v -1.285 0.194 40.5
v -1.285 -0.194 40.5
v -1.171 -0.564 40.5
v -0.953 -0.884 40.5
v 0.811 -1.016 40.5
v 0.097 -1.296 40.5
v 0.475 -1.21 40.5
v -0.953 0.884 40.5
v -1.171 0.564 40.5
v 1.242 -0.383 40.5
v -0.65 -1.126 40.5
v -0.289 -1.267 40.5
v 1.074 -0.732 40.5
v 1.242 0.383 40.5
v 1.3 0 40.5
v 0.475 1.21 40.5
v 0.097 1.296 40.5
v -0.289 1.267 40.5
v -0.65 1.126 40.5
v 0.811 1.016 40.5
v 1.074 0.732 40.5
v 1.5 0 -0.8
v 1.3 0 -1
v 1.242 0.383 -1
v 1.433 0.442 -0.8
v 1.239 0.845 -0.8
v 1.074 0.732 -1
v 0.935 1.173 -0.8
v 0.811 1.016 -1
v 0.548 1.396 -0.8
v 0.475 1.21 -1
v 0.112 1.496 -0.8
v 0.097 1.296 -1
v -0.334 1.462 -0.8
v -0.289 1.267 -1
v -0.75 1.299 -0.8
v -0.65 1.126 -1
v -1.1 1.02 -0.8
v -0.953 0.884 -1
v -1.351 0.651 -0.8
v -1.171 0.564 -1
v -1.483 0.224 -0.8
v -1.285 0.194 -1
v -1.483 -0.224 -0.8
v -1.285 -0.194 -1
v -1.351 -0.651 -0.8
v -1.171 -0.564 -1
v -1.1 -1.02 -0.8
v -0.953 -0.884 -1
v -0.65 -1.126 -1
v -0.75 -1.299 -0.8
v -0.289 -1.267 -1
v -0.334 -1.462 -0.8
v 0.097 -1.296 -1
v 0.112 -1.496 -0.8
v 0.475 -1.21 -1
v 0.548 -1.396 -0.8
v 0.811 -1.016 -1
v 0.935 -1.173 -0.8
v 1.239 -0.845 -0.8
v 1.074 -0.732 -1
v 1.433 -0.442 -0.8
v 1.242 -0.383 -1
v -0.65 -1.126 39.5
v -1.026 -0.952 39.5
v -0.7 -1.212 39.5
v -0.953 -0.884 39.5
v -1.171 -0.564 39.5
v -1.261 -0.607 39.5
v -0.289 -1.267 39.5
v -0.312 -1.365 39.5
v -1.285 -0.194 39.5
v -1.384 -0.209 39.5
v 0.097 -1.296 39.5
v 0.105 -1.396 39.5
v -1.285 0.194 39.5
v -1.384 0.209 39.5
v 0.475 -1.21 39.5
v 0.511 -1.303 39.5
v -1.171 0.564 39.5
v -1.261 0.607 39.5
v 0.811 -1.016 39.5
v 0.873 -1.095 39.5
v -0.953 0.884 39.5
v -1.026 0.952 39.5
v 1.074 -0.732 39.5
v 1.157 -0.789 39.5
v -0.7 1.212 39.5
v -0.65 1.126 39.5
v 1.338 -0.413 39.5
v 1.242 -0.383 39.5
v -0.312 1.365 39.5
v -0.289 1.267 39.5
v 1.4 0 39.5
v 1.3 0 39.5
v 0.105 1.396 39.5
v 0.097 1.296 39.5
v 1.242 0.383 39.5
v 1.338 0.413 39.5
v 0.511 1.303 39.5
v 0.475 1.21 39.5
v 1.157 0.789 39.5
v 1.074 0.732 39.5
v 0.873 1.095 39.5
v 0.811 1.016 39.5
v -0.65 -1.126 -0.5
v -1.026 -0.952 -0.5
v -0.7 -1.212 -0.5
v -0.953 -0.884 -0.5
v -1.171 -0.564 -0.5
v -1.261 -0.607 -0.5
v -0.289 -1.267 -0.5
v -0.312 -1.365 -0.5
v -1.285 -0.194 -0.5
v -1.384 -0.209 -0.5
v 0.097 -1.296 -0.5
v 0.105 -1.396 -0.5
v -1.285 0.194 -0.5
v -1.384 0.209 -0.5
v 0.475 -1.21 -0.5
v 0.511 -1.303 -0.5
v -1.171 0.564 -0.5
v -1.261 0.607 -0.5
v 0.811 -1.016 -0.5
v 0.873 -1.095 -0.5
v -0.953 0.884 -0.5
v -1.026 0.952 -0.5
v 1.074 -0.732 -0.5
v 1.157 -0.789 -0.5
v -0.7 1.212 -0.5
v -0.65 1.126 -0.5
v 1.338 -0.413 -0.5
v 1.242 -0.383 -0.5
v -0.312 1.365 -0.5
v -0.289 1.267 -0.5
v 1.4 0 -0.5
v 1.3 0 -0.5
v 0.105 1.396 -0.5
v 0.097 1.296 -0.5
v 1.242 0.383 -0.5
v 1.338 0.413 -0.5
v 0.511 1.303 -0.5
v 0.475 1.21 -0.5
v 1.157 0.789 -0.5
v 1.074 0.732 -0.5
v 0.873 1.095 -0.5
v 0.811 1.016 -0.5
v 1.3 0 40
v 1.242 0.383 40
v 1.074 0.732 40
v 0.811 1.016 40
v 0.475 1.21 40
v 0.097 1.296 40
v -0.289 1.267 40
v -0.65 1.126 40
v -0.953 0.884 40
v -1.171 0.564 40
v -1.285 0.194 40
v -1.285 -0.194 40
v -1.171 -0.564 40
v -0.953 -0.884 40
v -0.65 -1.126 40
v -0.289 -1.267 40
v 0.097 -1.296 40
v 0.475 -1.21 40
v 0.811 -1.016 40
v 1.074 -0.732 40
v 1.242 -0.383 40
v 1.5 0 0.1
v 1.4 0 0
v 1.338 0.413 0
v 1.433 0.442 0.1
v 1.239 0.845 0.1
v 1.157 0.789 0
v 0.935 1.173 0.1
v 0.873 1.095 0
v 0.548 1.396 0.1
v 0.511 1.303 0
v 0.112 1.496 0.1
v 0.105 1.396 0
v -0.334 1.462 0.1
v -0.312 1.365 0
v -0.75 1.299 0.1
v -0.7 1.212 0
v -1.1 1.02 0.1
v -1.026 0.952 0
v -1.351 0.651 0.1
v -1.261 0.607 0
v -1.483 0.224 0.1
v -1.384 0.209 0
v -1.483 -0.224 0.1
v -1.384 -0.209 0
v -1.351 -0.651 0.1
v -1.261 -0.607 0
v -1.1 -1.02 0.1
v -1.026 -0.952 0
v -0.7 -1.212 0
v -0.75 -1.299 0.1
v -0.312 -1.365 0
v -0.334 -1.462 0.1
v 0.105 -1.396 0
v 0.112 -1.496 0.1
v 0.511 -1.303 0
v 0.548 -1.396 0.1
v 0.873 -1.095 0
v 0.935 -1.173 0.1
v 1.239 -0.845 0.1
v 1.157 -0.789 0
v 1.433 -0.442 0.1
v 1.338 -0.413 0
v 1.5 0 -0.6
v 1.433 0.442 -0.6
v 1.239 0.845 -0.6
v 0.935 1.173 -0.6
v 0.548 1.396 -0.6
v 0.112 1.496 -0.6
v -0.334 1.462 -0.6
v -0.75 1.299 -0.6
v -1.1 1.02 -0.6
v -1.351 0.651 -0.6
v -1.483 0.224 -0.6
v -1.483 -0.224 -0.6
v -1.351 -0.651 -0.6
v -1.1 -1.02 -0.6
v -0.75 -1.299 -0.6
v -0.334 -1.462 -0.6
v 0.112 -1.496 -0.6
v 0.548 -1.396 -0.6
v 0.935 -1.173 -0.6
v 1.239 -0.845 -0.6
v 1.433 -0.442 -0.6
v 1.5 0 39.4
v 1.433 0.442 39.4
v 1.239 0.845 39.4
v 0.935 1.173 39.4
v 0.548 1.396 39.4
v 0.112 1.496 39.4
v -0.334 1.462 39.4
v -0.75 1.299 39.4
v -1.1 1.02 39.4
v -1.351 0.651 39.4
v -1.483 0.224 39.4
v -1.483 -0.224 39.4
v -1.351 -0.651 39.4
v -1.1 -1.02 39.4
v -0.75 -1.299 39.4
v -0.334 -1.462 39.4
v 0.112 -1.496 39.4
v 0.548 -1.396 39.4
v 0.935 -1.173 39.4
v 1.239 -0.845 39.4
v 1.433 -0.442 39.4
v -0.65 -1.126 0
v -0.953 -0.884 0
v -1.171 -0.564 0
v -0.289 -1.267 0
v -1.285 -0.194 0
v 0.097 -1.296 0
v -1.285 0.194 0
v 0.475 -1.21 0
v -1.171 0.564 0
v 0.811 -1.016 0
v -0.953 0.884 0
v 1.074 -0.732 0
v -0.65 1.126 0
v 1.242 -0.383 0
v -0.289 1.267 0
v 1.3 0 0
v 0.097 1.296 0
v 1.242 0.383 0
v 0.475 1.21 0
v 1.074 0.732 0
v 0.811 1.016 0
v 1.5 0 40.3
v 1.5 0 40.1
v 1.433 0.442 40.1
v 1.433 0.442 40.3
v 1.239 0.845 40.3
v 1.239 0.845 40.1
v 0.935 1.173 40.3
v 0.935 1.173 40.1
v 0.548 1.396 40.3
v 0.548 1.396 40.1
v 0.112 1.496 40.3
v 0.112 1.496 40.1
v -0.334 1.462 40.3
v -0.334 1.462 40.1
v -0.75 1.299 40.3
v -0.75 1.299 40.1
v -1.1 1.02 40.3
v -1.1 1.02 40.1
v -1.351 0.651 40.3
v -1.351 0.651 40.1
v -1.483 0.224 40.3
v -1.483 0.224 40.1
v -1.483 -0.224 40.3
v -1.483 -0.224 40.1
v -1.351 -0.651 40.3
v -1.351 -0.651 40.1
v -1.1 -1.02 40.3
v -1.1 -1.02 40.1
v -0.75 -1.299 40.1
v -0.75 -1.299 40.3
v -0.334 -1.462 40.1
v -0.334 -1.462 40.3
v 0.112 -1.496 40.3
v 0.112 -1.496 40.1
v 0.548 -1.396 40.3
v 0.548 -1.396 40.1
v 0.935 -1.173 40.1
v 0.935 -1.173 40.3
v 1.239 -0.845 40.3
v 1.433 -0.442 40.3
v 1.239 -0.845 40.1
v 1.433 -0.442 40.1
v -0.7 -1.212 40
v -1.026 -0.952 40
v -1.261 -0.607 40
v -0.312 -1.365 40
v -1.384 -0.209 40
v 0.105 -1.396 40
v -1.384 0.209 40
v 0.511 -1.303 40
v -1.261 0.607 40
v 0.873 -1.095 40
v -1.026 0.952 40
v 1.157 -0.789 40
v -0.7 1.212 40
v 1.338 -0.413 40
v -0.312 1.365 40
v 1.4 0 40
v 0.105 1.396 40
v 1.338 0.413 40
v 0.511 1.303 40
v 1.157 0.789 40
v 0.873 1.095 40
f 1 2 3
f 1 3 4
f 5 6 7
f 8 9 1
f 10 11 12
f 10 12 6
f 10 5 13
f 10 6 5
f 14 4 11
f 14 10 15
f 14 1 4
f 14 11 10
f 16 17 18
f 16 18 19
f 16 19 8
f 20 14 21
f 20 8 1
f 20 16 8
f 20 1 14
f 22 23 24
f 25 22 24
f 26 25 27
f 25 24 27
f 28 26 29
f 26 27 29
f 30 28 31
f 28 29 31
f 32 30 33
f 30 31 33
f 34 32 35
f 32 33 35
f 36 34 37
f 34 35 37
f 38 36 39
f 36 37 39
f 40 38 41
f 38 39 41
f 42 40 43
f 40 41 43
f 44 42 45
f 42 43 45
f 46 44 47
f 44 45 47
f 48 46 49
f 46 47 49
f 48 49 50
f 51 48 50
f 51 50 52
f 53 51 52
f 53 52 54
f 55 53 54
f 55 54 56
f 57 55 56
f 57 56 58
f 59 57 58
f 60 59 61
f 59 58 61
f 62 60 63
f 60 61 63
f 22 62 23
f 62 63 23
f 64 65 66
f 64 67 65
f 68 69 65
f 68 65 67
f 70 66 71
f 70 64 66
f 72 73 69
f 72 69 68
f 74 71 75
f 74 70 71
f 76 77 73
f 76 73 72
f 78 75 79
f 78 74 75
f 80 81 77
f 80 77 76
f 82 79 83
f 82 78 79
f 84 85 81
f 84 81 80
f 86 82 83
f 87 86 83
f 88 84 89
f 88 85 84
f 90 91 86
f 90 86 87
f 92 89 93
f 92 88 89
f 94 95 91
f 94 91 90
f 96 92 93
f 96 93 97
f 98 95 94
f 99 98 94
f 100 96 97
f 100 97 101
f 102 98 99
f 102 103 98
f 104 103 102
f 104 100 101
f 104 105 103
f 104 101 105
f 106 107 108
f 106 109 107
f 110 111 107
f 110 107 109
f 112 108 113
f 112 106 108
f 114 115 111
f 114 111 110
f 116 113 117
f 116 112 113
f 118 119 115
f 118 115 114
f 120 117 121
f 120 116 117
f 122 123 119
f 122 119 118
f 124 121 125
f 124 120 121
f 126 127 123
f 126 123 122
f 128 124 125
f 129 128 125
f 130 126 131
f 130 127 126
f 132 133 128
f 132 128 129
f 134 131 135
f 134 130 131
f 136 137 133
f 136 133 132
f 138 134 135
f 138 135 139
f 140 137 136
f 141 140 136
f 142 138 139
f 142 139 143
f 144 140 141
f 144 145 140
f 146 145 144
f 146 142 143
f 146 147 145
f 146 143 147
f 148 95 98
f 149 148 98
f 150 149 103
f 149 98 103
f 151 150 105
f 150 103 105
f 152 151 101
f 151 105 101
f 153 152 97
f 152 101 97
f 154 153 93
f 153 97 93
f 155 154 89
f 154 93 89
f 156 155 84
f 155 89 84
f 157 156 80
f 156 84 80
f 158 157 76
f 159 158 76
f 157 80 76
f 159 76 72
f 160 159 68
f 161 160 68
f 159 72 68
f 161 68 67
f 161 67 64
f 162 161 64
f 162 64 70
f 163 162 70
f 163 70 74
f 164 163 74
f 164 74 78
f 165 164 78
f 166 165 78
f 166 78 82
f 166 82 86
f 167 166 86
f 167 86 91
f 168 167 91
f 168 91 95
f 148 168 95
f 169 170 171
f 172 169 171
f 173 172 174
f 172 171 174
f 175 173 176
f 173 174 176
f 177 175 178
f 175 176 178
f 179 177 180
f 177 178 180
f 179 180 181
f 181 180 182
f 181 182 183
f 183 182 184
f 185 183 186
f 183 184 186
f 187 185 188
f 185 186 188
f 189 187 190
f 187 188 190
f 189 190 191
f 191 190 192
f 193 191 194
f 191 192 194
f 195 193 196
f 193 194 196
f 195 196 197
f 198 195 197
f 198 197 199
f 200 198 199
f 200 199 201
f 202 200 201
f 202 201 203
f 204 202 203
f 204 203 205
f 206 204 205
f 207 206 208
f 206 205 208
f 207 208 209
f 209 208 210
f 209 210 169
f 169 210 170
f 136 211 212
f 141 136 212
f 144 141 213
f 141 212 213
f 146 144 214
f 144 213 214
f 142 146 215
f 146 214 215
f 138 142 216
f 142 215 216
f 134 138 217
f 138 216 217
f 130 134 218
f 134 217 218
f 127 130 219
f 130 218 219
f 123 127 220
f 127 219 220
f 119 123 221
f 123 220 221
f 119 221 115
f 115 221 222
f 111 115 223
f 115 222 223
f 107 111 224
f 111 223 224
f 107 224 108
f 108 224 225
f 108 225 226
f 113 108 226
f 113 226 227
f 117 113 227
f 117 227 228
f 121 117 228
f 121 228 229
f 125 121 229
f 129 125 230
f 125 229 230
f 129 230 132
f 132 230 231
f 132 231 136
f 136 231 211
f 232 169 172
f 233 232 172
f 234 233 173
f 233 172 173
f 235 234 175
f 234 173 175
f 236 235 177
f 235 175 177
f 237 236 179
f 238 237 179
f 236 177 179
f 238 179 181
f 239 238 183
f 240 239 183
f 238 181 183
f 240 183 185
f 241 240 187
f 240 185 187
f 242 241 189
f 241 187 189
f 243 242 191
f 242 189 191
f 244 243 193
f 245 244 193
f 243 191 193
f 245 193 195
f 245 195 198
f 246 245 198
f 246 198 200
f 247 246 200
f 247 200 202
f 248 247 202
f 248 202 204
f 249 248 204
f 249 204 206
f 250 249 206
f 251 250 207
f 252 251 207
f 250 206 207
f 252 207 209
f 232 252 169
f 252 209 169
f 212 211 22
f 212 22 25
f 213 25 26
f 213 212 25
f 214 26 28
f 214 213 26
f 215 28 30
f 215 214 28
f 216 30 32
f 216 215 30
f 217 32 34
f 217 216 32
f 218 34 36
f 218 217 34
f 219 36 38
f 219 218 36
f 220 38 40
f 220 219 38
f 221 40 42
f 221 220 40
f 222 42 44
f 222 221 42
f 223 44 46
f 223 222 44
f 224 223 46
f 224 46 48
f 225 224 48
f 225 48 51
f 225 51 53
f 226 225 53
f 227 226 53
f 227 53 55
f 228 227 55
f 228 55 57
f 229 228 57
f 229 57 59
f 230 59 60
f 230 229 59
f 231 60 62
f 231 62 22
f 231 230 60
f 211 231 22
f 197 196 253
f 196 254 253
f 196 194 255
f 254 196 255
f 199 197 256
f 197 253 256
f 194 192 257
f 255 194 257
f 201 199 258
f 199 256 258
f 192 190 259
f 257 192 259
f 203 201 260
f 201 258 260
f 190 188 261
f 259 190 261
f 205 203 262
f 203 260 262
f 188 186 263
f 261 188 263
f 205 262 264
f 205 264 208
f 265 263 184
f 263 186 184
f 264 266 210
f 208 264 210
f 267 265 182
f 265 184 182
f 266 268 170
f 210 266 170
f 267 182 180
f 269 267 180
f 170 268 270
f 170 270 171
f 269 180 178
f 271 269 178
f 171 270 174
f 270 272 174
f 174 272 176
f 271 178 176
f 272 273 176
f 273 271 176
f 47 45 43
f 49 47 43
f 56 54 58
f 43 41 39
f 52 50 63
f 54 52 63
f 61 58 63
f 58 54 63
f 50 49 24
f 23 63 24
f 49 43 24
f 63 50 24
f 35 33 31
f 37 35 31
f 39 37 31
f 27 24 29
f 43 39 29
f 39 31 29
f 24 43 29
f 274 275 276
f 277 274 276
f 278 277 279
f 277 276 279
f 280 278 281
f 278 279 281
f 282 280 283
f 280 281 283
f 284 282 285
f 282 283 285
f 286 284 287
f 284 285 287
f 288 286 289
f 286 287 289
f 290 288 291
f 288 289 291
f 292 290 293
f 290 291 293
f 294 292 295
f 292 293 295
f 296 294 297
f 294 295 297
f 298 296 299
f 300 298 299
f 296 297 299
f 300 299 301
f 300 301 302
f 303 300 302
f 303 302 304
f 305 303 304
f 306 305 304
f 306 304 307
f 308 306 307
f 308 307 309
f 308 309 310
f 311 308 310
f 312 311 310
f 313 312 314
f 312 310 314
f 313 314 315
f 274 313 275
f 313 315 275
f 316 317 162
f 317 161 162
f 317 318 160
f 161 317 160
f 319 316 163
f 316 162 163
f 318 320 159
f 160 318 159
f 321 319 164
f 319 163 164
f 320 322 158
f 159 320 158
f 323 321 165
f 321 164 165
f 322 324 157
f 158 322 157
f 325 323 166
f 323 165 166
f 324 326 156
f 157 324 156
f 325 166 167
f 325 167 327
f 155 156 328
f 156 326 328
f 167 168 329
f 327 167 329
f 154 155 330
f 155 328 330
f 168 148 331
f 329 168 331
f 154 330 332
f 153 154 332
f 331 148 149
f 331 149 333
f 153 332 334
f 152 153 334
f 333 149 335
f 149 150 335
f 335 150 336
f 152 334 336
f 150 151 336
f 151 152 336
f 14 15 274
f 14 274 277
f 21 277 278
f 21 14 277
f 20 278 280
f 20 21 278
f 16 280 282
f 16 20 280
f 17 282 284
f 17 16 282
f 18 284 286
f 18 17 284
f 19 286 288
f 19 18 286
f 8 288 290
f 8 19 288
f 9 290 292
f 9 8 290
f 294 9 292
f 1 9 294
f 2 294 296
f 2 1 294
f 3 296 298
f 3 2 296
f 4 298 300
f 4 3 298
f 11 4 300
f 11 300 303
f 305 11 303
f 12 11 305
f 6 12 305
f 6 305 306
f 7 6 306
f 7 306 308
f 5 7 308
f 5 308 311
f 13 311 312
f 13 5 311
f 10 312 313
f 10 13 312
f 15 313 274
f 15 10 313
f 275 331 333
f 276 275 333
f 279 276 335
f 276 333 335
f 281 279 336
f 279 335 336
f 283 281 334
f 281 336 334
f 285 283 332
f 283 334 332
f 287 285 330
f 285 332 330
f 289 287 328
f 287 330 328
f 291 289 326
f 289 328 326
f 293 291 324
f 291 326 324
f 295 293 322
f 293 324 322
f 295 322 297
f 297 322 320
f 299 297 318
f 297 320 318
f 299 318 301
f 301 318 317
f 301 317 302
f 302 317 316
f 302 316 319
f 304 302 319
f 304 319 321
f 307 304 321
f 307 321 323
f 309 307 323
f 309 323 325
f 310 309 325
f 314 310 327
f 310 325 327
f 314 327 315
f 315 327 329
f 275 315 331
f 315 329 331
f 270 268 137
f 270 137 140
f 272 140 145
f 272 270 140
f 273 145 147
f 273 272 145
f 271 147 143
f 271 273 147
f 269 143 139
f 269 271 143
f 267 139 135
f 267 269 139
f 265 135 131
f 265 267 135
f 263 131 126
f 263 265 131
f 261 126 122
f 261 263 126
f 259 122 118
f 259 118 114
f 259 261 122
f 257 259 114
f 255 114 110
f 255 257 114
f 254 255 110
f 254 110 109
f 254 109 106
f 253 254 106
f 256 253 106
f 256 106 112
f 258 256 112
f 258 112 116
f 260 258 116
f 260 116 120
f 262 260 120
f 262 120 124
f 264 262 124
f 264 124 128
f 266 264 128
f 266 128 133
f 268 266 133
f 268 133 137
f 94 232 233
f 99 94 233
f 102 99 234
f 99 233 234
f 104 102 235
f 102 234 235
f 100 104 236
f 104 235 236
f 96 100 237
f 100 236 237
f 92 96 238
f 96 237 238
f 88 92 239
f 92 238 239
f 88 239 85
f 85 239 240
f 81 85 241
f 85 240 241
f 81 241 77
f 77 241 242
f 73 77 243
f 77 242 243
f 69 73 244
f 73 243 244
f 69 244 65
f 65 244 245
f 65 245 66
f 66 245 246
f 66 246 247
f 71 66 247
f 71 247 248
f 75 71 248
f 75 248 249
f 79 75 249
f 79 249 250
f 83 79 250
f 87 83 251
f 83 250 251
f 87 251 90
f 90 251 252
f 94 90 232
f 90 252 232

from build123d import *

# Parameters (mm, degrees)
F0_R        = 1.5
F0_R_2      = 1.3
F1_DEPTH    = 39.5
F2_DEPTH    = 1
F3_START    = -0.5
F3_DEPTH    = 0.5
F4_R        = 1.3
F5_DEPTH    = 1
F6_START    = 0.5
F1_FACE_R   = 1.5
F1_FACE_R_2 = 1.3
F6_DEPTH    = 0.5
F7_SIZE     = 0.2
F8_SIZE     = 0.1


with BuildPart() as f1:
    # F0 (on Top) → F1 (new body)
    with BuildSketch(Plane.XY):
        Circle(F0_R)
        Circle(F0_R_2, mode=Mode.SUBTRACT)
        Circle(F0_R_2)
    extrude(amount=F1_DEPTH)

    # F0 (on Top) → F2 (join)
    with BuildSketch(Plane.XY):
        Circle(F0_R_2)
    extrude(amount=-F2_DEPTH)

    # F0 (on Top) → F3 (join)
    with BuildSketch(Plane.XY.offset(F3_START)):
        Circle(F0_R)
        Circle(F0_R_2, mode=Mode.SUBTRACT)
    extrude(amount=-F3_DEPTH)

    # F4 (on face) → F5 (join)
    with BuildSketch(Plane.XY.offset(39.5)):
        Circle(F4_R)
    extrude(amount=F5_DEPTH)

    # F1_face (on face) → F6 (join)
    with BuildSketch(Plane.XY.offset(39.5).offset(F6_START)):
        Circle(F1_FACE_R)
        Circle(F1_FACE_R_2, mode=Mode.SUBTRACT)
    extrude(amount=F6_DEPTH)

    # F7
    f7_edges = [f1.edges().sort_by_distance(p)[0] for p in [
        (-1.5, 0, -1),
        (-1.5, 0, 40.5),
    ]]
    chamfer(f7_edges, length=F7_SIZE)

    # F8
    f8_edges = [f1.edges().sort_by_distance(p)[0] for p in [
        (-1.5, 0, -0.5),
        (-1.5, 0, 0),
        (-1.5, 0, 39.5),
        (-1.5, 0, 40),
    ]]
    chamfer(f8_edges, length=F8_SIZE)


solid = f1.part
